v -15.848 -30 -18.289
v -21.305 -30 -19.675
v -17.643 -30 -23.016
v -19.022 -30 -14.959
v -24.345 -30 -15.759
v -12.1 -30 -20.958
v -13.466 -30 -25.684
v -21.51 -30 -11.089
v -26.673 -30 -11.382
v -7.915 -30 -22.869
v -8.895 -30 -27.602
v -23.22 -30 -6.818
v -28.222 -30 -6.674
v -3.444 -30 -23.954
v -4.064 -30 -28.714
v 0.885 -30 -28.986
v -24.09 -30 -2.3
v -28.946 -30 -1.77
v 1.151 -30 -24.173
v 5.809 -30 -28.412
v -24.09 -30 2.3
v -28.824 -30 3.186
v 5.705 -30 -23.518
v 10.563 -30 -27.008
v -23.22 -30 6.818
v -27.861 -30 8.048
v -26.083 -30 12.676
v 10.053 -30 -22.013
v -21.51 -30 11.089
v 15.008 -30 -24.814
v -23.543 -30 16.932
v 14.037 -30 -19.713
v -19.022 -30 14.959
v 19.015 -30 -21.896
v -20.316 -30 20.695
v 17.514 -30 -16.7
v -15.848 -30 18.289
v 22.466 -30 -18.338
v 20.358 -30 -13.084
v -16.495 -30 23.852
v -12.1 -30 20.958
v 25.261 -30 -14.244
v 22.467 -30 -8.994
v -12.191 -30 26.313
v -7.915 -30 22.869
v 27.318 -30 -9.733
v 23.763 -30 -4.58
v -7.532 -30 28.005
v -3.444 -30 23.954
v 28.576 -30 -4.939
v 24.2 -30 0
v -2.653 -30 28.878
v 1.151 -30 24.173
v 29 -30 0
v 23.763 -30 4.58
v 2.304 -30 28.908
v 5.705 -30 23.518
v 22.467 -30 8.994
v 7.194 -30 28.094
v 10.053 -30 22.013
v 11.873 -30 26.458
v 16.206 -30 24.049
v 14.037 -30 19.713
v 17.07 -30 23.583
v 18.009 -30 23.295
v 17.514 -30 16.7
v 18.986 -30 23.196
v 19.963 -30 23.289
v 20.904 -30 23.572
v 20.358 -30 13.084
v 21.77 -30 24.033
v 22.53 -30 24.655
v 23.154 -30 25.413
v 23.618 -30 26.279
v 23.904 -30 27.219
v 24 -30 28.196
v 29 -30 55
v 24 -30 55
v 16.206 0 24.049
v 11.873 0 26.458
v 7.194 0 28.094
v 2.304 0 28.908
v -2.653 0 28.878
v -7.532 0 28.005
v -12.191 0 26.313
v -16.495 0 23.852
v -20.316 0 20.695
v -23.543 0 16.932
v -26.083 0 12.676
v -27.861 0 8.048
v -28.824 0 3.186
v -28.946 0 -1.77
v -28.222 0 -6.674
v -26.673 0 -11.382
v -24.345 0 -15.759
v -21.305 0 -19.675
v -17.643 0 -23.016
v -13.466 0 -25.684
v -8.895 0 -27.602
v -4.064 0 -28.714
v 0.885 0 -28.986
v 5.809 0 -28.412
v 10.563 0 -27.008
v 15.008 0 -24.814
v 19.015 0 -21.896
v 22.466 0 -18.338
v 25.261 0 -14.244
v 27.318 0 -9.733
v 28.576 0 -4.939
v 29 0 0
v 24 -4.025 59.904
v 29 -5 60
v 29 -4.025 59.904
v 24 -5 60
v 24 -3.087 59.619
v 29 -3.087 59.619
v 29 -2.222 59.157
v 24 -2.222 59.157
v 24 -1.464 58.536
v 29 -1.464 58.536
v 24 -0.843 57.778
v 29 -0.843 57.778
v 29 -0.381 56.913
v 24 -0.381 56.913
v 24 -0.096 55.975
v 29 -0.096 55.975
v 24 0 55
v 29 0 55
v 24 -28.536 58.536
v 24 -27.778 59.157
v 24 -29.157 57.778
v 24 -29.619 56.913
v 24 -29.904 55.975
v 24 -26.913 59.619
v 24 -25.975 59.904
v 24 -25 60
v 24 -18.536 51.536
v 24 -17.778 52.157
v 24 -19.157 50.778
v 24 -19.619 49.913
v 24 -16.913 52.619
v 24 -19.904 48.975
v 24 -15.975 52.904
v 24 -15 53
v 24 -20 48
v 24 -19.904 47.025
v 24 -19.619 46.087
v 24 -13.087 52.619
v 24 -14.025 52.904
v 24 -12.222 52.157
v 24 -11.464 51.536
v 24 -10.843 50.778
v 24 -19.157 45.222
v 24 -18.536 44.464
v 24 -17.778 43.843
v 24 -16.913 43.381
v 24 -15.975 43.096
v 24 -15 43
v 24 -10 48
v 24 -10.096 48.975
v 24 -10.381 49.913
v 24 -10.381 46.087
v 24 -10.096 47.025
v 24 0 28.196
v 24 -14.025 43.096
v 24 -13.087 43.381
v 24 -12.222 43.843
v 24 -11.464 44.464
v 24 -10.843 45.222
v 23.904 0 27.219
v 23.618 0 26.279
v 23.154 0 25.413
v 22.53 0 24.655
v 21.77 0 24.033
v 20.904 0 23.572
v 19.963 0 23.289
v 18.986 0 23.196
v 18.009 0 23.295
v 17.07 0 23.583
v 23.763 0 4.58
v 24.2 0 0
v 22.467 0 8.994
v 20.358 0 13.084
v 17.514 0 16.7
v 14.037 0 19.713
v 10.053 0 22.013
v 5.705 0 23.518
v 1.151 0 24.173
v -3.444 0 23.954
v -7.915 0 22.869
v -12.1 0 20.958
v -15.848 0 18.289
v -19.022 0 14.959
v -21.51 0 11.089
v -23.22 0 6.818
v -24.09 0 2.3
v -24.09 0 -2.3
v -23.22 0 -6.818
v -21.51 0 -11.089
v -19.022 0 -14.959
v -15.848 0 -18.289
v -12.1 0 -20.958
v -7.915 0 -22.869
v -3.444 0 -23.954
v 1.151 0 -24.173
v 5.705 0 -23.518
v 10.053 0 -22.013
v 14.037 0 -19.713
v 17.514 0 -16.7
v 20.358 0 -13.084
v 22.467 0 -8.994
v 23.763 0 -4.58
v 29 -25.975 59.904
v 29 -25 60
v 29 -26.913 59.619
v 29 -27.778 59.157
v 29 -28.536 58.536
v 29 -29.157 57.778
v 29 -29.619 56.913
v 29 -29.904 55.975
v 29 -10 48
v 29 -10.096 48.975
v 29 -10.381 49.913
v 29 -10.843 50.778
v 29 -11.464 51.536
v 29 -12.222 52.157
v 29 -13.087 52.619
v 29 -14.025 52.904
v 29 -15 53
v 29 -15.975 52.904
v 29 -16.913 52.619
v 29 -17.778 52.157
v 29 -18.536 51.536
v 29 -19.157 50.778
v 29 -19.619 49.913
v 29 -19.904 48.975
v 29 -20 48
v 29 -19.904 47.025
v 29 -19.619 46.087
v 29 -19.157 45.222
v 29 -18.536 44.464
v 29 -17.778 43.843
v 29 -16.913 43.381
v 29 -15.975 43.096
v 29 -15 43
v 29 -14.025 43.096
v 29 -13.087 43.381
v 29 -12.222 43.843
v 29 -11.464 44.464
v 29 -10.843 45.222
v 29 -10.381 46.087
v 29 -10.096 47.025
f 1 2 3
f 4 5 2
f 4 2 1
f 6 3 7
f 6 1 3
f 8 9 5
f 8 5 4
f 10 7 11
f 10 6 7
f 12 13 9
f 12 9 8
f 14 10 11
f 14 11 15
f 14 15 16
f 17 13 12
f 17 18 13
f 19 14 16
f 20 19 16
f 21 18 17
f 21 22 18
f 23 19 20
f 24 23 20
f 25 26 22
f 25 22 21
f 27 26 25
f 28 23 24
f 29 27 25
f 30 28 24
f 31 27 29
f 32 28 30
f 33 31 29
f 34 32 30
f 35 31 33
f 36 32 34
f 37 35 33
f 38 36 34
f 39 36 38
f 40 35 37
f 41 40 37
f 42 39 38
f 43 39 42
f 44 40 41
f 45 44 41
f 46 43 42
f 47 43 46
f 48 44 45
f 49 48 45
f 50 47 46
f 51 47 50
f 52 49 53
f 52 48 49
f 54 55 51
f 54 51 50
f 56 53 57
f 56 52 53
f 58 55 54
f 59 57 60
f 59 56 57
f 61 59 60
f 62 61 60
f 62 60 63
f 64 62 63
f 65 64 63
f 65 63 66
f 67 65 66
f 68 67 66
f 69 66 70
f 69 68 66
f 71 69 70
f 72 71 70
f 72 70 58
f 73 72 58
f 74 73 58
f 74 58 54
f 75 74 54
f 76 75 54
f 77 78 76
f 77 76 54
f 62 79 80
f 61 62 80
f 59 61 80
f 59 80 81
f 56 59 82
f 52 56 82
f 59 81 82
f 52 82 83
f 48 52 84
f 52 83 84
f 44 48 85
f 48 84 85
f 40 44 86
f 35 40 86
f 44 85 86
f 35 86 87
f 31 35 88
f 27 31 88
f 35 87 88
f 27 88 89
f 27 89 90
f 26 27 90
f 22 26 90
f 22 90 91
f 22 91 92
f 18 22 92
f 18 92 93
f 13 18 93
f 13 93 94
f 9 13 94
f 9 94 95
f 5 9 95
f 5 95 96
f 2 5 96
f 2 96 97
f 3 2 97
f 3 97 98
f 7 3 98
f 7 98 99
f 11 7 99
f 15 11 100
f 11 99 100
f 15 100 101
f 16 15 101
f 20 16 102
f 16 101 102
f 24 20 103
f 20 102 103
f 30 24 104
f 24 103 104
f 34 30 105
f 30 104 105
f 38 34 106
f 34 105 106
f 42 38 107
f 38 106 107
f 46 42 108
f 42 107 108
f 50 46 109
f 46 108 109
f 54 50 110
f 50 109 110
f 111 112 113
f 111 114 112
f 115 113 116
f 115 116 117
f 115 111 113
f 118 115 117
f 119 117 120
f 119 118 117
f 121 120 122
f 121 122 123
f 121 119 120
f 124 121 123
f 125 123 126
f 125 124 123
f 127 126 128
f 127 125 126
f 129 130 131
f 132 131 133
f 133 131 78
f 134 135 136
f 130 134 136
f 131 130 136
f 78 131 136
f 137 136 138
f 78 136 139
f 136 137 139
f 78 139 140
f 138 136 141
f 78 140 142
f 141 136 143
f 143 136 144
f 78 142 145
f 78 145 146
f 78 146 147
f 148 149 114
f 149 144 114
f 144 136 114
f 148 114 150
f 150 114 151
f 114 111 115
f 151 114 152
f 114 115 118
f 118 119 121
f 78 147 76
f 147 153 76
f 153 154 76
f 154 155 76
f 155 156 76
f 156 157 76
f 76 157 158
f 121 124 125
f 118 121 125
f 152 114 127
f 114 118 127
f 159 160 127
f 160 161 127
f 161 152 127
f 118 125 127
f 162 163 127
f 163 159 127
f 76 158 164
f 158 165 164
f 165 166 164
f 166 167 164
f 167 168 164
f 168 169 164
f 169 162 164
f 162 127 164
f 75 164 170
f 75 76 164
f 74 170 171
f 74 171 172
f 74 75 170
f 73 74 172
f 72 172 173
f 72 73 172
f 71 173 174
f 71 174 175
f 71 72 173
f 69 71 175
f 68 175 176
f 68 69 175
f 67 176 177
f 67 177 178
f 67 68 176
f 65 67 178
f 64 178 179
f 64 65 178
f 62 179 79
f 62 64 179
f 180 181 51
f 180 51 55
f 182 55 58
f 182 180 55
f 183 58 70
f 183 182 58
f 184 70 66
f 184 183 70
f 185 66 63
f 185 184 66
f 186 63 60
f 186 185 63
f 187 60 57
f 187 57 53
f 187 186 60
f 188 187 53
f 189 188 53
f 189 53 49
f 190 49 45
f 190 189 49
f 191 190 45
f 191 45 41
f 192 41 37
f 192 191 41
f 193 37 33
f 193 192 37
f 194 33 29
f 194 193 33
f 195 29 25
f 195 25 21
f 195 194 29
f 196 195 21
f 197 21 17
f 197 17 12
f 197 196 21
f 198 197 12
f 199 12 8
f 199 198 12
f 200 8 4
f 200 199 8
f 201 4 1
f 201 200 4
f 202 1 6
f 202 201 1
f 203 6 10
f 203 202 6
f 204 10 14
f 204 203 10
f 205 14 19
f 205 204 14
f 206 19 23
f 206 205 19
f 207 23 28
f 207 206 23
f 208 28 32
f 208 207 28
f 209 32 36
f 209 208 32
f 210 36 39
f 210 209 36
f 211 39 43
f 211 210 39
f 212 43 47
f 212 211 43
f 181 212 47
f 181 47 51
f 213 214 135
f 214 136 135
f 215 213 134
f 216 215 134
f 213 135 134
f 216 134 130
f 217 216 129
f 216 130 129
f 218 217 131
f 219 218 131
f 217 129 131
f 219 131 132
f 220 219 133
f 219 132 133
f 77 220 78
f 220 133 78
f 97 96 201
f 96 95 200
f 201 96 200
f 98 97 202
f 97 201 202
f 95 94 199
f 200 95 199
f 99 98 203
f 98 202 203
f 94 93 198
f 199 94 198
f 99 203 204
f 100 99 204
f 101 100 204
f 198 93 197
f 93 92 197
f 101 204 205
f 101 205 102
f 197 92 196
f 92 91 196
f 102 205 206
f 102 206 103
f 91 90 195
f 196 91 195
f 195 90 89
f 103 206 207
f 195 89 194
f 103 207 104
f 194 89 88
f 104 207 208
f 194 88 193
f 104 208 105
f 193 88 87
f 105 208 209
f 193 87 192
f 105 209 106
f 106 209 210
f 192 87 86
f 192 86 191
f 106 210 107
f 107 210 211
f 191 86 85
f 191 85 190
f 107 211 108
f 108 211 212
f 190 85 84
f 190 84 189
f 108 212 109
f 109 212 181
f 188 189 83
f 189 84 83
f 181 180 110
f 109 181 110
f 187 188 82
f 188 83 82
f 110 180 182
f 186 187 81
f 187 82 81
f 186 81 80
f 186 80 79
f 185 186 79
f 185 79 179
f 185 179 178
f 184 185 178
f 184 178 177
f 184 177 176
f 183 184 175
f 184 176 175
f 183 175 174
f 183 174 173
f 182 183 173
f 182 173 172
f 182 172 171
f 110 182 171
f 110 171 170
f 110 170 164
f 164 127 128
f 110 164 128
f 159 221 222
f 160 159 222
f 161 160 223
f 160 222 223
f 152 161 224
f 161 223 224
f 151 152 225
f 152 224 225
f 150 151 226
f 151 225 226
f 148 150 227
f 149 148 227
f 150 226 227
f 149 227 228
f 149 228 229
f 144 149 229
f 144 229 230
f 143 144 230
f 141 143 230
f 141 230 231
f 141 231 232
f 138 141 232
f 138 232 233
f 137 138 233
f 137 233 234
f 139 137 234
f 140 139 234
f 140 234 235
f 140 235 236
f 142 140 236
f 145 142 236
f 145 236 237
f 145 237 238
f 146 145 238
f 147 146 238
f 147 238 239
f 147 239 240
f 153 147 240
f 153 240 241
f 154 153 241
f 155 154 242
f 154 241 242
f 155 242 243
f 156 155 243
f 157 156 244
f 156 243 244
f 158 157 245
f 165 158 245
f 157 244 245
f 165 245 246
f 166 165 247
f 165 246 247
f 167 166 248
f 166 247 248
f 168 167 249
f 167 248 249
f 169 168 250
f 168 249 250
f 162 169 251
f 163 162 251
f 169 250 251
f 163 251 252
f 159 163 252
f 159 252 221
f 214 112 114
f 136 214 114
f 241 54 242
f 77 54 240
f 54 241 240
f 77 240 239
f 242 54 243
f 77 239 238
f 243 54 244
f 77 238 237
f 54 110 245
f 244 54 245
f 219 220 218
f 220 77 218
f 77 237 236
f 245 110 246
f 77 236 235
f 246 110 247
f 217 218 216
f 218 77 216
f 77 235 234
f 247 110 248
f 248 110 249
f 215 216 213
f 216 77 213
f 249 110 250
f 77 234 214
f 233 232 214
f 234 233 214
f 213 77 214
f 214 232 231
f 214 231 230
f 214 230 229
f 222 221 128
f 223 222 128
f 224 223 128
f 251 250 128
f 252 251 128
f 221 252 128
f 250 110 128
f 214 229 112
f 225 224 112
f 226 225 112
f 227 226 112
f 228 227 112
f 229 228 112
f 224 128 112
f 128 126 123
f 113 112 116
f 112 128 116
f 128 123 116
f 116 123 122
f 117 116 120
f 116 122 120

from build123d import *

# Parameters (mm, degrees)
F0_R     = 24.2
F1_DEPTH = 30
F2_R     = 5
F3_DEPTH = 25
F4_R     = 5


with BuildPart() as f1:
    # F0 (on Front) → F1 (new body)
    with BuildSketch(Plane.XZ):
        with BuildLine():
            Line((24, 60), (24, 16.278821))
            ThreePointArc((24, 16.278821), (-27.721833, -8.514693), (29, 0))
            Line((29, 0), (29, 60))
            Line((29, 60), (24, 60))
        make_face()
        Circle(F0_R, mode=Mode.SUBTRACT)
    extrude(amount=F1_DEPTH)

    # F2 (on face) → F3 (cut)
    with BuildSketch(Plane.YZ.offset(29)):
        with Locations((-15, 48)):
            Circle(F2_R)
    extrude(amount=-F3_DEPTH, mode=Mode.SUBTRACT)

    # F4
    f4_edges = [f1.edges().sort_by_distance(p)[0] for p in [
        (24, -15, 16.278821),
        (26.5, -30, 60),
        (26.5, 0, 60),
    ]]
    fillet(f4_edges, radius=F4_R)


solid = f1.part
